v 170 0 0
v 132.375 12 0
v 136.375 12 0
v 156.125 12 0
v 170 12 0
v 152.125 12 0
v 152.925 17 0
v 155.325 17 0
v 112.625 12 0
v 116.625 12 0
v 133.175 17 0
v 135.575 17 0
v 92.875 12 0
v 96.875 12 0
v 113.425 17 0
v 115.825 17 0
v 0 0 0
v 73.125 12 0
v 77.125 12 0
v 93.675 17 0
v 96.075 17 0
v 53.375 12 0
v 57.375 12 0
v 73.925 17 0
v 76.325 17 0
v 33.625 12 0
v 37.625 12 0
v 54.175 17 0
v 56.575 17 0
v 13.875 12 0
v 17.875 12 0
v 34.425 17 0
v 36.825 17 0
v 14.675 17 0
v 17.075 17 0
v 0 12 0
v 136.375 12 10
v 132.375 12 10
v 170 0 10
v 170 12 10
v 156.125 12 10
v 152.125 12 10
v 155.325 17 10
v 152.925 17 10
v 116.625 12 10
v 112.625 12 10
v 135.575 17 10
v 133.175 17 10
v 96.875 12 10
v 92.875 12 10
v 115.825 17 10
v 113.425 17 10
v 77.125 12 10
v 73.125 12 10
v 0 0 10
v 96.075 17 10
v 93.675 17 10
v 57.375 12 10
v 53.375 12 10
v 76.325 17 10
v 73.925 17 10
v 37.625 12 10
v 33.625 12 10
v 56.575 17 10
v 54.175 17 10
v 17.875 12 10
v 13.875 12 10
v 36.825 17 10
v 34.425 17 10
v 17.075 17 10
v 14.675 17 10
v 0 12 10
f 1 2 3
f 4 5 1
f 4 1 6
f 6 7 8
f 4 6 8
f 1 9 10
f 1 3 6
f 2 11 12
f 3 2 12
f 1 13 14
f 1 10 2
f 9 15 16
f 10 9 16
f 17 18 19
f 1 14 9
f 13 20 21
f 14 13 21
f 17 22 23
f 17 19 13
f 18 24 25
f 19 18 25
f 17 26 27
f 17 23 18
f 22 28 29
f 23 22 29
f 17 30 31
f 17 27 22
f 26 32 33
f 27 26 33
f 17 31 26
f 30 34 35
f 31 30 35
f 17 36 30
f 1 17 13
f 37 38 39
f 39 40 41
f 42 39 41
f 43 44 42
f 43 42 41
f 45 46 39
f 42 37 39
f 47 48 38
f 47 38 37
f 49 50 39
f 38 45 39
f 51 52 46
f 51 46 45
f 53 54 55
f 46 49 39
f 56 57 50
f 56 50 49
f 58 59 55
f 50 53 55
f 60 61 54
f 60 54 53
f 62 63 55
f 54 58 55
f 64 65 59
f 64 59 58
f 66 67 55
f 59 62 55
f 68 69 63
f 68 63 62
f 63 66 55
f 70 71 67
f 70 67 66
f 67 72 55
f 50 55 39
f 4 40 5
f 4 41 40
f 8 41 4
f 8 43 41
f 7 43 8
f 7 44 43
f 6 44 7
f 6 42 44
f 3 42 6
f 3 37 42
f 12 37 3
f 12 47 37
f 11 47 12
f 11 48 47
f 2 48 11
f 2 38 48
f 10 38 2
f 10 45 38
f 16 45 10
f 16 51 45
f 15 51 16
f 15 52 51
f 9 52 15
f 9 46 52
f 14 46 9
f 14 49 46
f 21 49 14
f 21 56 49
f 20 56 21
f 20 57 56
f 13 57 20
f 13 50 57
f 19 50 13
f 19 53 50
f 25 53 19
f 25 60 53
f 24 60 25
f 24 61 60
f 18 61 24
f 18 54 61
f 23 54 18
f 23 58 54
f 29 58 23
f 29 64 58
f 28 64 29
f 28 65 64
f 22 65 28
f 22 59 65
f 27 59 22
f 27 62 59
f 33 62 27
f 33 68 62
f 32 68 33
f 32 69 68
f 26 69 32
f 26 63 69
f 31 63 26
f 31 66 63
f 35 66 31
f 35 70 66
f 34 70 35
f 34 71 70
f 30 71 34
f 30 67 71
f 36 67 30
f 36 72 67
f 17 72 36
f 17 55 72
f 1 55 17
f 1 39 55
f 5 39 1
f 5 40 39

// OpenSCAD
$fn = 32;

// ----------------------------------------------------------------------
// Gear rack: 8 teeth on a 170 mm bar, pitch 19.75 mm
// ----------------------------------------------------------------------

// --- parameters (mm) ---
profile_height = 10;      // extrusion height
profile_points = 36;      // points of the closed outline

profile = [[0, 0], [170, 0], [170, 12], [156.125, 12], [155.325, 17], [152.925, 17], [152.125, 12], [136.375, 12], [135.575, 17], [133.175, 17], [132.375, 12], [116.625, 12], [115.825, 17], [113.425, 17], [112.625, 12], [96.875, 12], [96.075, 17], [93.675, 17], [92.875, 12], [77.125, 12], [76.325, 17], [73.925, 17], [73.125, 12], [57.375, 12], [56.575, 17], [54.175, 17], [53.375, 12], [37.625, 12], [36.825, 17], [34.425, 17], [33.625, 12], [17.875, 12], [17.075, 17], [14.675, 17], [13.875, 12], [0, 12]];  // single closed polygon, 36 points, counter clockwise

// --- the one profile operation ---
linear_extrude(height = profile_height) polygon(points = profile);
